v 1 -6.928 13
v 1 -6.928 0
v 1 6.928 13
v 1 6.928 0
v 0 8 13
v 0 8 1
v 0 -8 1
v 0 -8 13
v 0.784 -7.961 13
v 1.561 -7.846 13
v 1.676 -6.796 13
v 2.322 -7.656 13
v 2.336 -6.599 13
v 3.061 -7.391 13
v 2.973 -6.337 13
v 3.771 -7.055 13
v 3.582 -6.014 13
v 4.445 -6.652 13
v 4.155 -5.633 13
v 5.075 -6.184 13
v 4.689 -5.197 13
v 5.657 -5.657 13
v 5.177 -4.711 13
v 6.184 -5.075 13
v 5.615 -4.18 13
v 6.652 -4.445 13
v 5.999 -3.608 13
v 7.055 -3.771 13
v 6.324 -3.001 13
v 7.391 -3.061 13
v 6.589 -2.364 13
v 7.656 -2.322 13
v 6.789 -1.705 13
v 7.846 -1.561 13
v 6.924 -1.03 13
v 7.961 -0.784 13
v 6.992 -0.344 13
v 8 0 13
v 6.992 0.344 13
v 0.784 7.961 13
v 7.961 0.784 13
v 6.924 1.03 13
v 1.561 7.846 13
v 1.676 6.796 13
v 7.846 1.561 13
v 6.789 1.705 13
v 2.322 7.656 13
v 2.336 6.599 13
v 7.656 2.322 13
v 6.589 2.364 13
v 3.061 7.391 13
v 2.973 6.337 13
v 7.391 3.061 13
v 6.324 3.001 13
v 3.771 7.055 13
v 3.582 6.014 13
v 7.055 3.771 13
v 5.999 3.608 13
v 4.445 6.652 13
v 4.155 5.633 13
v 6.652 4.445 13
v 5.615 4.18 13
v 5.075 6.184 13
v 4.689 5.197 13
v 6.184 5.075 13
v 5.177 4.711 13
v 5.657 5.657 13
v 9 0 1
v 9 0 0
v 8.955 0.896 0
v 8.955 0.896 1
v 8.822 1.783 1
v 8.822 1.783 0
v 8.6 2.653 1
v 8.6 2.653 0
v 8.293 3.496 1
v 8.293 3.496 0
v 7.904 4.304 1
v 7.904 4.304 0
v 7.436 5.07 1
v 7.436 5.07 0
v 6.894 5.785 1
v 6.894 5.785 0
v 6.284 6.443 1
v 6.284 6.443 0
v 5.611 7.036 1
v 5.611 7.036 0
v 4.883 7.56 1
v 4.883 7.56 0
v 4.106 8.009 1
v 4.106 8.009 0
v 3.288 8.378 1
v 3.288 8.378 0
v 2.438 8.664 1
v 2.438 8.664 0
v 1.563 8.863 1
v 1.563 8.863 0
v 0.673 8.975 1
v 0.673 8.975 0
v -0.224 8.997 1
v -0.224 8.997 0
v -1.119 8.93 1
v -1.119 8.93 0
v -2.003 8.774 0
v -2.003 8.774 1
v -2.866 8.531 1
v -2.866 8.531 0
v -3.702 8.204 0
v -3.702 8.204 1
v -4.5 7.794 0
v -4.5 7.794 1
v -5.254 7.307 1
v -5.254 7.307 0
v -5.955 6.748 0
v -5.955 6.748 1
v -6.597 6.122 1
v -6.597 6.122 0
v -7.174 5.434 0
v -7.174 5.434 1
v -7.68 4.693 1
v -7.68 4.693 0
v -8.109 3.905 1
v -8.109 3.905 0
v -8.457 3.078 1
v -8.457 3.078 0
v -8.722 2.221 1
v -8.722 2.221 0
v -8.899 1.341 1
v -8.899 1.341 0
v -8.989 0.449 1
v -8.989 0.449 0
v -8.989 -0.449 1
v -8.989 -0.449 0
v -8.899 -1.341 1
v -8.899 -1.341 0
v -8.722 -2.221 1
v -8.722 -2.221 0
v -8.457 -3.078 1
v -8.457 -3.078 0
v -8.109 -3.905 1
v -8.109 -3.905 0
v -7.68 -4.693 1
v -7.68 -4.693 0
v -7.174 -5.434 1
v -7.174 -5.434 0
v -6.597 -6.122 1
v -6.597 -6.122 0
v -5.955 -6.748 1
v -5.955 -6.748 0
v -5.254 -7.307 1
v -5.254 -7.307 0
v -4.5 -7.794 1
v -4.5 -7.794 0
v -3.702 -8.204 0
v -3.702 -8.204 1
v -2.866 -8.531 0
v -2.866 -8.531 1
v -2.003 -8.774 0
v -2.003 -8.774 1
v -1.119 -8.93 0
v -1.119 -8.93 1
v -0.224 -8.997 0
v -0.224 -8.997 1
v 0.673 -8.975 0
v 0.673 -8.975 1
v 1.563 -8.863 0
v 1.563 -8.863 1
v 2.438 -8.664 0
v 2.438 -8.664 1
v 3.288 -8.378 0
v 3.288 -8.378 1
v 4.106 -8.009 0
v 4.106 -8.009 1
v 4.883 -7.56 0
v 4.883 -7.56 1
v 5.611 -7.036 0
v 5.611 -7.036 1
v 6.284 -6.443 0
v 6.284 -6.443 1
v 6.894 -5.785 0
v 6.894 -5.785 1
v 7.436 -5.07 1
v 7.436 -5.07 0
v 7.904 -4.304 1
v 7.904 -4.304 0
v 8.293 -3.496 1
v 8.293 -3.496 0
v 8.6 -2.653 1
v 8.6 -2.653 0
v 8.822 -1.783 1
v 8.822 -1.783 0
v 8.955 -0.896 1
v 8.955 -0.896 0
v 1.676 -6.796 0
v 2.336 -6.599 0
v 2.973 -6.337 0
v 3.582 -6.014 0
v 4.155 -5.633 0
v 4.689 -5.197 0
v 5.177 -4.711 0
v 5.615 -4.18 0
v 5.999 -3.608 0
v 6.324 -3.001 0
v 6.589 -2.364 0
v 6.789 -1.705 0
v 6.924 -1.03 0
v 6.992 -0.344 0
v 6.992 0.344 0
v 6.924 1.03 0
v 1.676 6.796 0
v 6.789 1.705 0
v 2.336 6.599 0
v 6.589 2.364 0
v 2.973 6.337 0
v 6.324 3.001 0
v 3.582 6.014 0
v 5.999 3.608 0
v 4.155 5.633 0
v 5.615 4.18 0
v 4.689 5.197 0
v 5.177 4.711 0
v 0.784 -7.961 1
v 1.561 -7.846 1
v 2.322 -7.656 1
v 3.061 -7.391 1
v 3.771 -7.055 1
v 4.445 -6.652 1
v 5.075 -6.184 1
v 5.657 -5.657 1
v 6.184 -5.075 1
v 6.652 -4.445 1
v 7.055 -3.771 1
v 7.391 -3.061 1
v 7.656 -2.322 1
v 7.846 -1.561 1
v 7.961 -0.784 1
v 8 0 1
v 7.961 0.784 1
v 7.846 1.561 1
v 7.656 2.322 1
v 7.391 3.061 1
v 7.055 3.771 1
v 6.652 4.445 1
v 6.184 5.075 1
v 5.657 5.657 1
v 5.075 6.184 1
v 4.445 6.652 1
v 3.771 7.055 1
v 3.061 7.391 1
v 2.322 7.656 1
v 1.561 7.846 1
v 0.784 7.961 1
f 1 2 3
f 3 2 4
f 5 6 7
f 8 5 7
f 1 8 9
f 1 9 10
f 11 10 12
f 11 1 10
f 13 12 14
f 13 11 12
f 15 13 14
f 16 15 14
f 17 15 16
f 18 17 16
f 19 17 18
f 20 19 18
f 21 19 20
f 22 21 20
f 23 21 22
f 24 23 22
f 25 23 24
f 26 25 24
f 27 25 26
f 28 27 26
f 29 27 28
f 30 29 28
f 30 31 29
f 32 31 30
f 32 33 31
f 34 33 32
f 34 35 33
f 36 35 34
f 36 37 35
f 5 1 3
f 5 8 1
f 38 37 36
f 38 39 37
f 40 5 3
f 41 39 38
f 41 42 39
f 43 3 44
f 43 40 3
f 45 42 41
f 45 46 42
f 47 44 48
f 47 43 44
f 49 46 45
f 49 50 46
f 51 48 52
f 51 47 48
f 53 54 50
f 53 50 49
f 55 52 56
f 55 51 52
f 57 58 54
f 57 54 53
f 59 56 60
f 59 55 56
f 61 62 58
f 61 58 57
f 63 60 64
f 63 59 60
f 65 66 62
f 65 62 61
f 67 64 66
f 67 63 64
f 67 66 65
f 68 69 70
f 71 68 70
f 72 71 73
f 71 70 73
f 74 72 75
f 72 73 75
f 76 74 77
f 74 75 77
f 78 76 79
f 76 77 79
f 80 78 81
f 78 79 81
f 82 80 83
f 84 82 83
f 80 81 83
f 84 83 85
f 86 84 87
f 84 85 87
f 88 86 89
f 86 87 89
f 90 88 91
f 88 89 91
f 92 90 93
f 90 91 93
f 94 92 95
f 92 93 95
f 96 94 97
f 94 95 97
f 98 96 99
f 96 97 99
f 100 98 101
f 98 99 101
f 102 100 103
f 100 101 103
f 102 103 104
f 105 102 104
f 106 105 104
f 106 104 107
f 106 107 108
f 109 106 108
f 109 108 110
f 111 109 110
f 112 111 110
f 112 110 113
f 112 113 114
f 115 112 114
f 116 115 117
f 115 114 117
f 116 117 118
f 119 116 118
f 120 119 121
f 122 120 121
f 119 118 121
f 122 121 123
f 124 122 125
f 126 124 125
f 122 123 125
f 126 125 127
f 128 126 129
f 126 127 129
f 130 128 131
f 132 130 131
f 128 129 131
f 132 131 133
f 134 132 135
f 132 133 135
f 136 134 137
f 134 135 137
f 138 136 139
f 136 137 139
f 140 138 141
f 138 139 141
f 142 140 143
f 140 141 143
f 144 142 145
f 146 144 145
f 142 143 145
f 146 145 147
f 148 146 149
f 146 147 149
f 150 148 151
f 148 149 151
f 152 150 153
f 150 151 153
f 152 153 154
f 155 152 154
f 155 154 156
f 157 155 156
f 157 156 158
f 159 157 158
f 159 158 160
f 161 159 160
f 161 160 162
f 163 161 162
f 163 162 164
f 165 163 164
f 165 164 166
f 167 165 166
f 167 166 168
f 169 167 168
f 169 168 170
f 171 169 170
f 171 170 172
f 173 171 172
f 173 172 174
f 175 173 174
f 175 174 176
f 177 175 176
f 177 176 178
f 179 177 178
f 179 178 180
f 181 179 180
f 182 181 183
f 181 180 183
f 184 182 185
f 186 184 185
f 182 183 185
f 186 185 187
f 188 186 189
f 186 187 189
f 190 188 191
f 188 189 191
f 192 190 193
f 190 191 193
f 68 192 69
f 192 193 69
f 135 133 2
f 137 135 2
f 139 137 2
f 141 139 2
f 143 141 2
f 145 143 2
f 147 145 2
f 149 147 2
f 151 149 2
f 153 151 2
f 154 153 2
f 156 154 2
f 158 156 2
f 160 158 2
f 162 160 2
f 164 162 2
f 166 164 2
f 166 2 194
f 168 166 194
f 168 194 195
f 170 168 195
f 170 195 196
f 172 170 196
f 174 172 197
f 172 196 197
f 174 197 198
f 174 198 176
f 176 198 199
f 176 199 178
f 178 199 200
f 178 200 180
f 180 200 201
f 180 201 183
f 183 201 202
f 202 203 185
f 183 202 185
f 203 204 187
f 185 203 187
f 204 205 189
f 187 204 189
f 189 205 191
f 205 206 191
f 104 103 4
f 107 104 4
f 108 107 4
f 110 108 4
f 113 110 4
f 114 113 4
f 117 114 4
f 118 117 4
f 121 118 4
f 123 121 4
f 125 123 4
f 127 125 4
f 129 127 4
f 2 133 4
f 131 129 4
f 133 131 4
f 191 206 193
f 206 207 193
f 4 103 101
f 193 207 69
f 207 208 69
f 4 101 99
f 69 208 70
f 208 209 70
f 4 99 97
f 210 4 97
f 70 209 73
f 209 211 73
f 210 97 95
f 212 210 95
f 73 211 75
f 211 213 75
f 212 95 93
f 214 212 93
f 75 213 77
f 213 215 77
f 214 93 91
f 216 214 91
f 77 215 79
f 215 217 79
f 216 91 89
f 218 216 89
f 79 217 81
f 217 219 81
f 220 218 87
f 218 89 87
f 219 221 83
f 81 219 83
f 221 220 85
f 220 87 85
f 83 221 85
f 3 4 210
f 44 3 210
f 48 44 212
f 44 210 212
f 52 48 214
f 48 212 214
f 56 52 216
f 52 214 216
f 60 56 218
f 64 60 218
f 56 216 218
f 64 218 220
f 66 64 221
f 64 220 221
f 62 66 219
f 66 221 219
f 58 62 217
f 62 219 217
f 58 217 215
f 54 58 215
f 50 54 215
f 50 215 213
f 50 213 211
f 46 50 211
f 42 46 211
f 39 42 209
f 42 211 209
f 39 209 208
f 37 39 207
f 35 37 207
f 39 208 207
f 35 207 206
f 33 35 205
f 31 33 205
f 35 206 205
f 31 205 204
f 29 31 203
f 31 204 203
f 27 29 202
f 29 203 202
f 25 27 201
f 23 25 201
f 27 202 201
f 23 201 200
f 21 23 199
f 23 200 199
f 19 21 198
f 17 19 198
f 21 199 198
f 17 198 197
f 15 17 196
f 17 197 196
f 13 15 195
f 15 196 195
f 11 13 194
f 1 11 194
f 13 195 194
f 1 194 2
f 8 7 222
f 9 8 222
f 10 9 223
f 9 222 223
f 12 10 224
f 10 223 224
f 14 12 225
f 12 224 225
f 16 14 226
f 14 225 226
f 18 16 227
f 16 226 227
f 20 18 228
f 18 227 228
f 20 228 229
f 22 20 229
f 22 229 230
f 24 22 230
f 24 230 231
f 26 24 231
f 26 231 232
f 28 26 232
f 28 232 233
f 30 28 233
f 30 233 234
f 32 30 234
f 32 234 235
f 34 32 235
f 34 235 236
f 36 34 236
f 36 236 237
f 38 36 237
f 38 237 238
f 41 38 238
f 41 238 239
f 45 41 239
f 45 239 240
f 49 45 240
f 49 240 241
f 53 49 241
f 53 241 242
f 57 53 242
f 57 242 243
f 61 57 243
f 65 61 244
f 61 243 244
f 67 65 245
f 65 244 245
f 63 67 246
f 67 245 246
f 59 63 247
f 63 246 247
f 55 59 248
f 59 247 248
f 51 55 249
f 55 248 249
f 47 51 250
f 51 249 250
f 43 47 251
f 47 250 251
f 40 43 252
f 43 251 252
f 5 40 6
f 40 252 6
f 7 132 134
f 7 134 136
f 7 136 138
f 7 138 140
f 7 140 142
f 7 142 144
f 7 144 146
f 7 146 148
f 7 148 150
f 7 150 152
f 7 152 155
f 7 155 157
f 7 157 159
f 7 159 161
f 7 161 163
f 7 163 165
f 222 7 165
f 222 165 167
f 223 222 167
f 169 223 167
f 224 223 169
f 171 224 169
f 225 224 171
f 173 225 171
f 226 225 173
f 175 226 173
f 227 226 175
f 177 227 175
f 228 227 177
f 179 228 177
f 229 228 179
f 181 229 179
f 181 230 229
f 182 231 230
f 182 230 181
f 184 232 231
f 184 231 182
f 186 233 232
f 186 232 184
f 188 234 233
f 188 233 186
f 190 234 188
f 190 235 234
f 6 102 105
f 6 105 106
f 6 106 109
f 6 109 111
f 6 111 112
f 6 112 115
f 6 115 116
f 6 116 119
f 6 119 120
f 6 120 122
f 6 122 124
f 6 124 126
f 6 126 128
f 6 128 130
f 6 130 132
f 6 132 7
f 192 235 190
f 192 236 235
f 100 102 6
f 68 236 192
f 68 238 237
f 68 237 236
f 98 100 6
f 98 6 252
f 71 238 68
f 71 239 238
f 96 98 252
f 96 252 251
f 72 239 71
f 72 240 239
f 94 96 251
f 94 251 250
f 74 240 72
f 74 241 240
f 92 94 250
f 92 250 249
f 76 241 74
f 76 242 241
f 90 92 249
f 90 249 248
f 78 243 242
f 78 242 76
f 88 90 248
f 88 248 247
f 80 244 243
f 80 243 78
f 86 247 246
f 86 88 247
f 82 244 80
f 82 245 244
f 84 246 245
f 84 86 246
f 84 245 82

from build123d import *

# Parameters (mm, degrees)
F1_DEPTH = 13
F0_R     = 9
F2_DEPTH = 1


with BuildPart() as f1:
    # F0 (on Top) → F1 (new body)
    with BuildSketch(Plane.XY):
        with BuildLine():
            Line((0, 8), (0, -8))
            ThreePointArc((0, -8), (8, 0), (0, 8))
        make_face()
        with BuildLine():
            ThreePointArc((1, 6.928203), (7, 0), (1, -6.928203))
            Line((1, -6.928203), (1, 6.928203))
        make_face(mode=Mode.SUBTRACT)
    extrude(amount=F1_DEPTH)

    # F0 (on Top) → F2 (join)
    with BuildSketch(Plane.XY):
        Circle(F0_R)
        with BuildLine():
            ThreePointArc((0, 8), (8, 0), (0, -8))
            Line((0, -8), (0, 8))
        make_face(mode=Mode.SUBTRACT)
    extrude(amount=F2_DEPTH)


solid = f1.part
